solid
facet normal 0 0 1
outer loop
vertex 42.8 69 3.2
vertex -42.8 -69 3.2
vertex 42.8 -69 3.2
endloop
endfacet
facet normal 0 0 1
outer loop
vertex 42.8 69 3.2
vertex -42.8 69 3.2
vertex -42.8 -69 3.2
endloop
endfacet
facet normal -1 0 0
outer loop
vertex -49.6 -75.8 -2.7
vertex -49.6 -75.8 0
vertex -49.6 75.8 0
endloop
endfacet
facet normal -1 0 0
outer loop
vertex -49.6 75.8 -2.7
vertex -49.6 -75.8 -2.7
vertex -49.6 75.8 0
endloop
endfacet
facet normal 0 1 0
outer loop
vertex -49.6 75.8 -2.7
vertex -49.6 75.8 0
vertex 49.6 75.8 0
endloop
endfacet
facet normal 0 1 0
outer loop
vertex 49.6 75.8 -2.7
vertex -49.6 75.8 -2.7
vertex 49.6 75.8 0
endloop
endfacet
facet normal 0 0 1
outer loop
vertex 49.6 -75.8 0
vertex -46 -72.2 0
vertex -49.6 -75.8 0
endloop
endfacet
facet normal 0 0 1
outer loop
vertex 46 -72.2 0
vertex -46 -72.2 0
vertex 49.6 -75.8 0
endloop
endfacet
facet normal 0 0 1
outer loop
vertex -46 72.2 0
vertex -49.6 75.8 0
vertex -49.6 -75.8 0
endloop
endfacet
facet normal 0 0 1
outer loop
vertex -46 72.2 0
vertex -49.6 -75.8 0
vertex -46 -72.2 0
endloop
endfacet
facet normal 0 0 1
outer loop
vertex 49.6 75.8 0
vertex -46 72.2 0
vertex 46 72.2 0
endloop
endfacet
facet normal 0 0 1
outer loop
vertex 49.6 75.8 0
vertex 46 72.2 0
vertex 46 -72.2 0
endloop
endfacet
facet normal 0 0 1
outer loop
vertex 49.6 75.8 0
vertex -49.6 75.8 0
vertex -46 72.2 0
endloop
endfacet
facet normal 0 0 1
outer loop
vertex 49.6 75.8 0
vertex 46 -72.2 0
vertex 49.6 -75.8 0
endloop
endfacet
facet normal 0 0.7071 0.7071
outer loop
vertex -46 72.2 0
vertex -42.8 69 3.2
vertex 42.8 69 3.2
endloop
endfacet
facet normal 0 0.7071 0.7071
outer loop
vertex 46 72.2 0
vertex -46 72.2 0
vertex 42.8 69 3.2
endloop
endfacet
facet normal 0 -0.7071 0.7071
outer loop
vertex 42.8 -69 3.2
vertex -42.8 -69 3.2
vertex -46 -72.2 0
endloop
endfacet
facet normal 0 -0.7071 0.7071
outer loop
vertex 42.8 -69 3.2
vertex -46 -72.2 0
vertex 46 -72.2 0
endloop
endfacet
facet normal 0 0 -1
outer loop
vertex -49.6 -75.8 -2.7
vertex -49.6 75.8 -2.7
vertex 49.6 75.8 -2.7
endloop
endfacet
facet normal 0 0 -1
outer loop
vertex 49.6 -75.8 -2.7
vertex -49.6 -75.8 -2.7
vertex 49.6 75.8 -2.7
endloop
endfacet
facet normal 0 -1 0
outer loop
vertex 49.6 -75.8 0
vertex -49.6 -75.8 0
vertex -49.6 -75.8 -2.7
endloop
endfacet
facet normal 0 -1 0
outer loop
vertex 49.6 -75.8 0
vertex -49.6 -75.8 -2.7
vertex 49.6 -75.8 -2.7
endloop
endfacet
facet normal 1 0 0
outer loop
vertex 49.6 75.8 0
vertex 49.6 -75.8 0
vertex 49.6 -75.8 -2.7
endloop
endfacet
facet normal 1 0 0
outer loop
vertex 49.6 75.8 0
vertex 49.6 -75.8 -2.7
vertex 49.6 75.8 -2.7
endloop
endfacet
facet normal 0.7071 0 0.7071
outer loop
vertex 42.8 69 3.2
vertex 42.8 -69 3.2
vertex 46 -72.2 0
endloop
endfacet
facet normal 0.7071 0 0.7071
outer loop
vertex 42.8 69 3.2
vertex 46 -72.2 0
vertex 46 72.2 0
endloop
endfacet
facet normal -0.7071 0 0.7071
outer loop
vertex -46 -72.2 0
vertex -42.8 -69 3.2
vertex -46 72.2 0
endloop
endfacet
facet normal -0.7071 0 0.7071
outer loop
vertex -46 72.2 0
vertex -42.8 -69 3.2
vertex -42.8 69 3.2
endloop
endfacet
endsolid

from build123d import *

# Parameters (mm, degrees)
F0_W     = 99.2
F0_H     = 151.6
F0_W_2   = 92
F0_H_2   = 144.4
F0_W_3   = 85.6
F0_H_3   = 138
F1_DEPTH = 2.7
F2_DEPTH = 3.2
F3_SIZE  = 3.19999


# Not quite as in the source:
# - a fillet or chamfer is up to 0.001 mm smaller than in the source, because OpenCascade refuses the exact size


with BuildPart() as f1:
    # F0 (on Top) → F1 (new body)
    with BuildSketch(Plane.XY):
        Rectangle(F0_W, F0_H)
        Rectangle(F0_W_2, F0_H_2, mode=Mode.SUBTRACT)
        Rectangle(F0_W_2, F0_H_2)
        Rectangle(F0_W_3, F0_H_3, mode=Mode.SUBTRACT)
        Rectangle(F0_W_3, F0_H_3)
    extrude(amount=-F1_DEPTH)

    # F0 (on Top) → F2 (join)
    with BuildSketch(Plane.XY):
        Rectangle(F0_W_2, F0_H_2)
        Rectangle(F0_W_3, F0_H_3, mode=Mode.SUBTRACT)
        Rectangle(F0_W_3, F0_H_3)
    extrude(amount=F2_DEPTH)

    # F3 (size 3.2 in the source; OpenCascade refuses exactly that, so slightly less here)
    f3_edges = [f1.edges().sort_by_distance(p)[0] for p in [
        (0, -72.2, 3.2),
        (-46, 0, 3.2),
        (46, 0, 3.2),
        (0, 72.2, 3.2),
    ]]
    chamfer(f3_edges, length=F3_SIZE)


solid = f1.part
